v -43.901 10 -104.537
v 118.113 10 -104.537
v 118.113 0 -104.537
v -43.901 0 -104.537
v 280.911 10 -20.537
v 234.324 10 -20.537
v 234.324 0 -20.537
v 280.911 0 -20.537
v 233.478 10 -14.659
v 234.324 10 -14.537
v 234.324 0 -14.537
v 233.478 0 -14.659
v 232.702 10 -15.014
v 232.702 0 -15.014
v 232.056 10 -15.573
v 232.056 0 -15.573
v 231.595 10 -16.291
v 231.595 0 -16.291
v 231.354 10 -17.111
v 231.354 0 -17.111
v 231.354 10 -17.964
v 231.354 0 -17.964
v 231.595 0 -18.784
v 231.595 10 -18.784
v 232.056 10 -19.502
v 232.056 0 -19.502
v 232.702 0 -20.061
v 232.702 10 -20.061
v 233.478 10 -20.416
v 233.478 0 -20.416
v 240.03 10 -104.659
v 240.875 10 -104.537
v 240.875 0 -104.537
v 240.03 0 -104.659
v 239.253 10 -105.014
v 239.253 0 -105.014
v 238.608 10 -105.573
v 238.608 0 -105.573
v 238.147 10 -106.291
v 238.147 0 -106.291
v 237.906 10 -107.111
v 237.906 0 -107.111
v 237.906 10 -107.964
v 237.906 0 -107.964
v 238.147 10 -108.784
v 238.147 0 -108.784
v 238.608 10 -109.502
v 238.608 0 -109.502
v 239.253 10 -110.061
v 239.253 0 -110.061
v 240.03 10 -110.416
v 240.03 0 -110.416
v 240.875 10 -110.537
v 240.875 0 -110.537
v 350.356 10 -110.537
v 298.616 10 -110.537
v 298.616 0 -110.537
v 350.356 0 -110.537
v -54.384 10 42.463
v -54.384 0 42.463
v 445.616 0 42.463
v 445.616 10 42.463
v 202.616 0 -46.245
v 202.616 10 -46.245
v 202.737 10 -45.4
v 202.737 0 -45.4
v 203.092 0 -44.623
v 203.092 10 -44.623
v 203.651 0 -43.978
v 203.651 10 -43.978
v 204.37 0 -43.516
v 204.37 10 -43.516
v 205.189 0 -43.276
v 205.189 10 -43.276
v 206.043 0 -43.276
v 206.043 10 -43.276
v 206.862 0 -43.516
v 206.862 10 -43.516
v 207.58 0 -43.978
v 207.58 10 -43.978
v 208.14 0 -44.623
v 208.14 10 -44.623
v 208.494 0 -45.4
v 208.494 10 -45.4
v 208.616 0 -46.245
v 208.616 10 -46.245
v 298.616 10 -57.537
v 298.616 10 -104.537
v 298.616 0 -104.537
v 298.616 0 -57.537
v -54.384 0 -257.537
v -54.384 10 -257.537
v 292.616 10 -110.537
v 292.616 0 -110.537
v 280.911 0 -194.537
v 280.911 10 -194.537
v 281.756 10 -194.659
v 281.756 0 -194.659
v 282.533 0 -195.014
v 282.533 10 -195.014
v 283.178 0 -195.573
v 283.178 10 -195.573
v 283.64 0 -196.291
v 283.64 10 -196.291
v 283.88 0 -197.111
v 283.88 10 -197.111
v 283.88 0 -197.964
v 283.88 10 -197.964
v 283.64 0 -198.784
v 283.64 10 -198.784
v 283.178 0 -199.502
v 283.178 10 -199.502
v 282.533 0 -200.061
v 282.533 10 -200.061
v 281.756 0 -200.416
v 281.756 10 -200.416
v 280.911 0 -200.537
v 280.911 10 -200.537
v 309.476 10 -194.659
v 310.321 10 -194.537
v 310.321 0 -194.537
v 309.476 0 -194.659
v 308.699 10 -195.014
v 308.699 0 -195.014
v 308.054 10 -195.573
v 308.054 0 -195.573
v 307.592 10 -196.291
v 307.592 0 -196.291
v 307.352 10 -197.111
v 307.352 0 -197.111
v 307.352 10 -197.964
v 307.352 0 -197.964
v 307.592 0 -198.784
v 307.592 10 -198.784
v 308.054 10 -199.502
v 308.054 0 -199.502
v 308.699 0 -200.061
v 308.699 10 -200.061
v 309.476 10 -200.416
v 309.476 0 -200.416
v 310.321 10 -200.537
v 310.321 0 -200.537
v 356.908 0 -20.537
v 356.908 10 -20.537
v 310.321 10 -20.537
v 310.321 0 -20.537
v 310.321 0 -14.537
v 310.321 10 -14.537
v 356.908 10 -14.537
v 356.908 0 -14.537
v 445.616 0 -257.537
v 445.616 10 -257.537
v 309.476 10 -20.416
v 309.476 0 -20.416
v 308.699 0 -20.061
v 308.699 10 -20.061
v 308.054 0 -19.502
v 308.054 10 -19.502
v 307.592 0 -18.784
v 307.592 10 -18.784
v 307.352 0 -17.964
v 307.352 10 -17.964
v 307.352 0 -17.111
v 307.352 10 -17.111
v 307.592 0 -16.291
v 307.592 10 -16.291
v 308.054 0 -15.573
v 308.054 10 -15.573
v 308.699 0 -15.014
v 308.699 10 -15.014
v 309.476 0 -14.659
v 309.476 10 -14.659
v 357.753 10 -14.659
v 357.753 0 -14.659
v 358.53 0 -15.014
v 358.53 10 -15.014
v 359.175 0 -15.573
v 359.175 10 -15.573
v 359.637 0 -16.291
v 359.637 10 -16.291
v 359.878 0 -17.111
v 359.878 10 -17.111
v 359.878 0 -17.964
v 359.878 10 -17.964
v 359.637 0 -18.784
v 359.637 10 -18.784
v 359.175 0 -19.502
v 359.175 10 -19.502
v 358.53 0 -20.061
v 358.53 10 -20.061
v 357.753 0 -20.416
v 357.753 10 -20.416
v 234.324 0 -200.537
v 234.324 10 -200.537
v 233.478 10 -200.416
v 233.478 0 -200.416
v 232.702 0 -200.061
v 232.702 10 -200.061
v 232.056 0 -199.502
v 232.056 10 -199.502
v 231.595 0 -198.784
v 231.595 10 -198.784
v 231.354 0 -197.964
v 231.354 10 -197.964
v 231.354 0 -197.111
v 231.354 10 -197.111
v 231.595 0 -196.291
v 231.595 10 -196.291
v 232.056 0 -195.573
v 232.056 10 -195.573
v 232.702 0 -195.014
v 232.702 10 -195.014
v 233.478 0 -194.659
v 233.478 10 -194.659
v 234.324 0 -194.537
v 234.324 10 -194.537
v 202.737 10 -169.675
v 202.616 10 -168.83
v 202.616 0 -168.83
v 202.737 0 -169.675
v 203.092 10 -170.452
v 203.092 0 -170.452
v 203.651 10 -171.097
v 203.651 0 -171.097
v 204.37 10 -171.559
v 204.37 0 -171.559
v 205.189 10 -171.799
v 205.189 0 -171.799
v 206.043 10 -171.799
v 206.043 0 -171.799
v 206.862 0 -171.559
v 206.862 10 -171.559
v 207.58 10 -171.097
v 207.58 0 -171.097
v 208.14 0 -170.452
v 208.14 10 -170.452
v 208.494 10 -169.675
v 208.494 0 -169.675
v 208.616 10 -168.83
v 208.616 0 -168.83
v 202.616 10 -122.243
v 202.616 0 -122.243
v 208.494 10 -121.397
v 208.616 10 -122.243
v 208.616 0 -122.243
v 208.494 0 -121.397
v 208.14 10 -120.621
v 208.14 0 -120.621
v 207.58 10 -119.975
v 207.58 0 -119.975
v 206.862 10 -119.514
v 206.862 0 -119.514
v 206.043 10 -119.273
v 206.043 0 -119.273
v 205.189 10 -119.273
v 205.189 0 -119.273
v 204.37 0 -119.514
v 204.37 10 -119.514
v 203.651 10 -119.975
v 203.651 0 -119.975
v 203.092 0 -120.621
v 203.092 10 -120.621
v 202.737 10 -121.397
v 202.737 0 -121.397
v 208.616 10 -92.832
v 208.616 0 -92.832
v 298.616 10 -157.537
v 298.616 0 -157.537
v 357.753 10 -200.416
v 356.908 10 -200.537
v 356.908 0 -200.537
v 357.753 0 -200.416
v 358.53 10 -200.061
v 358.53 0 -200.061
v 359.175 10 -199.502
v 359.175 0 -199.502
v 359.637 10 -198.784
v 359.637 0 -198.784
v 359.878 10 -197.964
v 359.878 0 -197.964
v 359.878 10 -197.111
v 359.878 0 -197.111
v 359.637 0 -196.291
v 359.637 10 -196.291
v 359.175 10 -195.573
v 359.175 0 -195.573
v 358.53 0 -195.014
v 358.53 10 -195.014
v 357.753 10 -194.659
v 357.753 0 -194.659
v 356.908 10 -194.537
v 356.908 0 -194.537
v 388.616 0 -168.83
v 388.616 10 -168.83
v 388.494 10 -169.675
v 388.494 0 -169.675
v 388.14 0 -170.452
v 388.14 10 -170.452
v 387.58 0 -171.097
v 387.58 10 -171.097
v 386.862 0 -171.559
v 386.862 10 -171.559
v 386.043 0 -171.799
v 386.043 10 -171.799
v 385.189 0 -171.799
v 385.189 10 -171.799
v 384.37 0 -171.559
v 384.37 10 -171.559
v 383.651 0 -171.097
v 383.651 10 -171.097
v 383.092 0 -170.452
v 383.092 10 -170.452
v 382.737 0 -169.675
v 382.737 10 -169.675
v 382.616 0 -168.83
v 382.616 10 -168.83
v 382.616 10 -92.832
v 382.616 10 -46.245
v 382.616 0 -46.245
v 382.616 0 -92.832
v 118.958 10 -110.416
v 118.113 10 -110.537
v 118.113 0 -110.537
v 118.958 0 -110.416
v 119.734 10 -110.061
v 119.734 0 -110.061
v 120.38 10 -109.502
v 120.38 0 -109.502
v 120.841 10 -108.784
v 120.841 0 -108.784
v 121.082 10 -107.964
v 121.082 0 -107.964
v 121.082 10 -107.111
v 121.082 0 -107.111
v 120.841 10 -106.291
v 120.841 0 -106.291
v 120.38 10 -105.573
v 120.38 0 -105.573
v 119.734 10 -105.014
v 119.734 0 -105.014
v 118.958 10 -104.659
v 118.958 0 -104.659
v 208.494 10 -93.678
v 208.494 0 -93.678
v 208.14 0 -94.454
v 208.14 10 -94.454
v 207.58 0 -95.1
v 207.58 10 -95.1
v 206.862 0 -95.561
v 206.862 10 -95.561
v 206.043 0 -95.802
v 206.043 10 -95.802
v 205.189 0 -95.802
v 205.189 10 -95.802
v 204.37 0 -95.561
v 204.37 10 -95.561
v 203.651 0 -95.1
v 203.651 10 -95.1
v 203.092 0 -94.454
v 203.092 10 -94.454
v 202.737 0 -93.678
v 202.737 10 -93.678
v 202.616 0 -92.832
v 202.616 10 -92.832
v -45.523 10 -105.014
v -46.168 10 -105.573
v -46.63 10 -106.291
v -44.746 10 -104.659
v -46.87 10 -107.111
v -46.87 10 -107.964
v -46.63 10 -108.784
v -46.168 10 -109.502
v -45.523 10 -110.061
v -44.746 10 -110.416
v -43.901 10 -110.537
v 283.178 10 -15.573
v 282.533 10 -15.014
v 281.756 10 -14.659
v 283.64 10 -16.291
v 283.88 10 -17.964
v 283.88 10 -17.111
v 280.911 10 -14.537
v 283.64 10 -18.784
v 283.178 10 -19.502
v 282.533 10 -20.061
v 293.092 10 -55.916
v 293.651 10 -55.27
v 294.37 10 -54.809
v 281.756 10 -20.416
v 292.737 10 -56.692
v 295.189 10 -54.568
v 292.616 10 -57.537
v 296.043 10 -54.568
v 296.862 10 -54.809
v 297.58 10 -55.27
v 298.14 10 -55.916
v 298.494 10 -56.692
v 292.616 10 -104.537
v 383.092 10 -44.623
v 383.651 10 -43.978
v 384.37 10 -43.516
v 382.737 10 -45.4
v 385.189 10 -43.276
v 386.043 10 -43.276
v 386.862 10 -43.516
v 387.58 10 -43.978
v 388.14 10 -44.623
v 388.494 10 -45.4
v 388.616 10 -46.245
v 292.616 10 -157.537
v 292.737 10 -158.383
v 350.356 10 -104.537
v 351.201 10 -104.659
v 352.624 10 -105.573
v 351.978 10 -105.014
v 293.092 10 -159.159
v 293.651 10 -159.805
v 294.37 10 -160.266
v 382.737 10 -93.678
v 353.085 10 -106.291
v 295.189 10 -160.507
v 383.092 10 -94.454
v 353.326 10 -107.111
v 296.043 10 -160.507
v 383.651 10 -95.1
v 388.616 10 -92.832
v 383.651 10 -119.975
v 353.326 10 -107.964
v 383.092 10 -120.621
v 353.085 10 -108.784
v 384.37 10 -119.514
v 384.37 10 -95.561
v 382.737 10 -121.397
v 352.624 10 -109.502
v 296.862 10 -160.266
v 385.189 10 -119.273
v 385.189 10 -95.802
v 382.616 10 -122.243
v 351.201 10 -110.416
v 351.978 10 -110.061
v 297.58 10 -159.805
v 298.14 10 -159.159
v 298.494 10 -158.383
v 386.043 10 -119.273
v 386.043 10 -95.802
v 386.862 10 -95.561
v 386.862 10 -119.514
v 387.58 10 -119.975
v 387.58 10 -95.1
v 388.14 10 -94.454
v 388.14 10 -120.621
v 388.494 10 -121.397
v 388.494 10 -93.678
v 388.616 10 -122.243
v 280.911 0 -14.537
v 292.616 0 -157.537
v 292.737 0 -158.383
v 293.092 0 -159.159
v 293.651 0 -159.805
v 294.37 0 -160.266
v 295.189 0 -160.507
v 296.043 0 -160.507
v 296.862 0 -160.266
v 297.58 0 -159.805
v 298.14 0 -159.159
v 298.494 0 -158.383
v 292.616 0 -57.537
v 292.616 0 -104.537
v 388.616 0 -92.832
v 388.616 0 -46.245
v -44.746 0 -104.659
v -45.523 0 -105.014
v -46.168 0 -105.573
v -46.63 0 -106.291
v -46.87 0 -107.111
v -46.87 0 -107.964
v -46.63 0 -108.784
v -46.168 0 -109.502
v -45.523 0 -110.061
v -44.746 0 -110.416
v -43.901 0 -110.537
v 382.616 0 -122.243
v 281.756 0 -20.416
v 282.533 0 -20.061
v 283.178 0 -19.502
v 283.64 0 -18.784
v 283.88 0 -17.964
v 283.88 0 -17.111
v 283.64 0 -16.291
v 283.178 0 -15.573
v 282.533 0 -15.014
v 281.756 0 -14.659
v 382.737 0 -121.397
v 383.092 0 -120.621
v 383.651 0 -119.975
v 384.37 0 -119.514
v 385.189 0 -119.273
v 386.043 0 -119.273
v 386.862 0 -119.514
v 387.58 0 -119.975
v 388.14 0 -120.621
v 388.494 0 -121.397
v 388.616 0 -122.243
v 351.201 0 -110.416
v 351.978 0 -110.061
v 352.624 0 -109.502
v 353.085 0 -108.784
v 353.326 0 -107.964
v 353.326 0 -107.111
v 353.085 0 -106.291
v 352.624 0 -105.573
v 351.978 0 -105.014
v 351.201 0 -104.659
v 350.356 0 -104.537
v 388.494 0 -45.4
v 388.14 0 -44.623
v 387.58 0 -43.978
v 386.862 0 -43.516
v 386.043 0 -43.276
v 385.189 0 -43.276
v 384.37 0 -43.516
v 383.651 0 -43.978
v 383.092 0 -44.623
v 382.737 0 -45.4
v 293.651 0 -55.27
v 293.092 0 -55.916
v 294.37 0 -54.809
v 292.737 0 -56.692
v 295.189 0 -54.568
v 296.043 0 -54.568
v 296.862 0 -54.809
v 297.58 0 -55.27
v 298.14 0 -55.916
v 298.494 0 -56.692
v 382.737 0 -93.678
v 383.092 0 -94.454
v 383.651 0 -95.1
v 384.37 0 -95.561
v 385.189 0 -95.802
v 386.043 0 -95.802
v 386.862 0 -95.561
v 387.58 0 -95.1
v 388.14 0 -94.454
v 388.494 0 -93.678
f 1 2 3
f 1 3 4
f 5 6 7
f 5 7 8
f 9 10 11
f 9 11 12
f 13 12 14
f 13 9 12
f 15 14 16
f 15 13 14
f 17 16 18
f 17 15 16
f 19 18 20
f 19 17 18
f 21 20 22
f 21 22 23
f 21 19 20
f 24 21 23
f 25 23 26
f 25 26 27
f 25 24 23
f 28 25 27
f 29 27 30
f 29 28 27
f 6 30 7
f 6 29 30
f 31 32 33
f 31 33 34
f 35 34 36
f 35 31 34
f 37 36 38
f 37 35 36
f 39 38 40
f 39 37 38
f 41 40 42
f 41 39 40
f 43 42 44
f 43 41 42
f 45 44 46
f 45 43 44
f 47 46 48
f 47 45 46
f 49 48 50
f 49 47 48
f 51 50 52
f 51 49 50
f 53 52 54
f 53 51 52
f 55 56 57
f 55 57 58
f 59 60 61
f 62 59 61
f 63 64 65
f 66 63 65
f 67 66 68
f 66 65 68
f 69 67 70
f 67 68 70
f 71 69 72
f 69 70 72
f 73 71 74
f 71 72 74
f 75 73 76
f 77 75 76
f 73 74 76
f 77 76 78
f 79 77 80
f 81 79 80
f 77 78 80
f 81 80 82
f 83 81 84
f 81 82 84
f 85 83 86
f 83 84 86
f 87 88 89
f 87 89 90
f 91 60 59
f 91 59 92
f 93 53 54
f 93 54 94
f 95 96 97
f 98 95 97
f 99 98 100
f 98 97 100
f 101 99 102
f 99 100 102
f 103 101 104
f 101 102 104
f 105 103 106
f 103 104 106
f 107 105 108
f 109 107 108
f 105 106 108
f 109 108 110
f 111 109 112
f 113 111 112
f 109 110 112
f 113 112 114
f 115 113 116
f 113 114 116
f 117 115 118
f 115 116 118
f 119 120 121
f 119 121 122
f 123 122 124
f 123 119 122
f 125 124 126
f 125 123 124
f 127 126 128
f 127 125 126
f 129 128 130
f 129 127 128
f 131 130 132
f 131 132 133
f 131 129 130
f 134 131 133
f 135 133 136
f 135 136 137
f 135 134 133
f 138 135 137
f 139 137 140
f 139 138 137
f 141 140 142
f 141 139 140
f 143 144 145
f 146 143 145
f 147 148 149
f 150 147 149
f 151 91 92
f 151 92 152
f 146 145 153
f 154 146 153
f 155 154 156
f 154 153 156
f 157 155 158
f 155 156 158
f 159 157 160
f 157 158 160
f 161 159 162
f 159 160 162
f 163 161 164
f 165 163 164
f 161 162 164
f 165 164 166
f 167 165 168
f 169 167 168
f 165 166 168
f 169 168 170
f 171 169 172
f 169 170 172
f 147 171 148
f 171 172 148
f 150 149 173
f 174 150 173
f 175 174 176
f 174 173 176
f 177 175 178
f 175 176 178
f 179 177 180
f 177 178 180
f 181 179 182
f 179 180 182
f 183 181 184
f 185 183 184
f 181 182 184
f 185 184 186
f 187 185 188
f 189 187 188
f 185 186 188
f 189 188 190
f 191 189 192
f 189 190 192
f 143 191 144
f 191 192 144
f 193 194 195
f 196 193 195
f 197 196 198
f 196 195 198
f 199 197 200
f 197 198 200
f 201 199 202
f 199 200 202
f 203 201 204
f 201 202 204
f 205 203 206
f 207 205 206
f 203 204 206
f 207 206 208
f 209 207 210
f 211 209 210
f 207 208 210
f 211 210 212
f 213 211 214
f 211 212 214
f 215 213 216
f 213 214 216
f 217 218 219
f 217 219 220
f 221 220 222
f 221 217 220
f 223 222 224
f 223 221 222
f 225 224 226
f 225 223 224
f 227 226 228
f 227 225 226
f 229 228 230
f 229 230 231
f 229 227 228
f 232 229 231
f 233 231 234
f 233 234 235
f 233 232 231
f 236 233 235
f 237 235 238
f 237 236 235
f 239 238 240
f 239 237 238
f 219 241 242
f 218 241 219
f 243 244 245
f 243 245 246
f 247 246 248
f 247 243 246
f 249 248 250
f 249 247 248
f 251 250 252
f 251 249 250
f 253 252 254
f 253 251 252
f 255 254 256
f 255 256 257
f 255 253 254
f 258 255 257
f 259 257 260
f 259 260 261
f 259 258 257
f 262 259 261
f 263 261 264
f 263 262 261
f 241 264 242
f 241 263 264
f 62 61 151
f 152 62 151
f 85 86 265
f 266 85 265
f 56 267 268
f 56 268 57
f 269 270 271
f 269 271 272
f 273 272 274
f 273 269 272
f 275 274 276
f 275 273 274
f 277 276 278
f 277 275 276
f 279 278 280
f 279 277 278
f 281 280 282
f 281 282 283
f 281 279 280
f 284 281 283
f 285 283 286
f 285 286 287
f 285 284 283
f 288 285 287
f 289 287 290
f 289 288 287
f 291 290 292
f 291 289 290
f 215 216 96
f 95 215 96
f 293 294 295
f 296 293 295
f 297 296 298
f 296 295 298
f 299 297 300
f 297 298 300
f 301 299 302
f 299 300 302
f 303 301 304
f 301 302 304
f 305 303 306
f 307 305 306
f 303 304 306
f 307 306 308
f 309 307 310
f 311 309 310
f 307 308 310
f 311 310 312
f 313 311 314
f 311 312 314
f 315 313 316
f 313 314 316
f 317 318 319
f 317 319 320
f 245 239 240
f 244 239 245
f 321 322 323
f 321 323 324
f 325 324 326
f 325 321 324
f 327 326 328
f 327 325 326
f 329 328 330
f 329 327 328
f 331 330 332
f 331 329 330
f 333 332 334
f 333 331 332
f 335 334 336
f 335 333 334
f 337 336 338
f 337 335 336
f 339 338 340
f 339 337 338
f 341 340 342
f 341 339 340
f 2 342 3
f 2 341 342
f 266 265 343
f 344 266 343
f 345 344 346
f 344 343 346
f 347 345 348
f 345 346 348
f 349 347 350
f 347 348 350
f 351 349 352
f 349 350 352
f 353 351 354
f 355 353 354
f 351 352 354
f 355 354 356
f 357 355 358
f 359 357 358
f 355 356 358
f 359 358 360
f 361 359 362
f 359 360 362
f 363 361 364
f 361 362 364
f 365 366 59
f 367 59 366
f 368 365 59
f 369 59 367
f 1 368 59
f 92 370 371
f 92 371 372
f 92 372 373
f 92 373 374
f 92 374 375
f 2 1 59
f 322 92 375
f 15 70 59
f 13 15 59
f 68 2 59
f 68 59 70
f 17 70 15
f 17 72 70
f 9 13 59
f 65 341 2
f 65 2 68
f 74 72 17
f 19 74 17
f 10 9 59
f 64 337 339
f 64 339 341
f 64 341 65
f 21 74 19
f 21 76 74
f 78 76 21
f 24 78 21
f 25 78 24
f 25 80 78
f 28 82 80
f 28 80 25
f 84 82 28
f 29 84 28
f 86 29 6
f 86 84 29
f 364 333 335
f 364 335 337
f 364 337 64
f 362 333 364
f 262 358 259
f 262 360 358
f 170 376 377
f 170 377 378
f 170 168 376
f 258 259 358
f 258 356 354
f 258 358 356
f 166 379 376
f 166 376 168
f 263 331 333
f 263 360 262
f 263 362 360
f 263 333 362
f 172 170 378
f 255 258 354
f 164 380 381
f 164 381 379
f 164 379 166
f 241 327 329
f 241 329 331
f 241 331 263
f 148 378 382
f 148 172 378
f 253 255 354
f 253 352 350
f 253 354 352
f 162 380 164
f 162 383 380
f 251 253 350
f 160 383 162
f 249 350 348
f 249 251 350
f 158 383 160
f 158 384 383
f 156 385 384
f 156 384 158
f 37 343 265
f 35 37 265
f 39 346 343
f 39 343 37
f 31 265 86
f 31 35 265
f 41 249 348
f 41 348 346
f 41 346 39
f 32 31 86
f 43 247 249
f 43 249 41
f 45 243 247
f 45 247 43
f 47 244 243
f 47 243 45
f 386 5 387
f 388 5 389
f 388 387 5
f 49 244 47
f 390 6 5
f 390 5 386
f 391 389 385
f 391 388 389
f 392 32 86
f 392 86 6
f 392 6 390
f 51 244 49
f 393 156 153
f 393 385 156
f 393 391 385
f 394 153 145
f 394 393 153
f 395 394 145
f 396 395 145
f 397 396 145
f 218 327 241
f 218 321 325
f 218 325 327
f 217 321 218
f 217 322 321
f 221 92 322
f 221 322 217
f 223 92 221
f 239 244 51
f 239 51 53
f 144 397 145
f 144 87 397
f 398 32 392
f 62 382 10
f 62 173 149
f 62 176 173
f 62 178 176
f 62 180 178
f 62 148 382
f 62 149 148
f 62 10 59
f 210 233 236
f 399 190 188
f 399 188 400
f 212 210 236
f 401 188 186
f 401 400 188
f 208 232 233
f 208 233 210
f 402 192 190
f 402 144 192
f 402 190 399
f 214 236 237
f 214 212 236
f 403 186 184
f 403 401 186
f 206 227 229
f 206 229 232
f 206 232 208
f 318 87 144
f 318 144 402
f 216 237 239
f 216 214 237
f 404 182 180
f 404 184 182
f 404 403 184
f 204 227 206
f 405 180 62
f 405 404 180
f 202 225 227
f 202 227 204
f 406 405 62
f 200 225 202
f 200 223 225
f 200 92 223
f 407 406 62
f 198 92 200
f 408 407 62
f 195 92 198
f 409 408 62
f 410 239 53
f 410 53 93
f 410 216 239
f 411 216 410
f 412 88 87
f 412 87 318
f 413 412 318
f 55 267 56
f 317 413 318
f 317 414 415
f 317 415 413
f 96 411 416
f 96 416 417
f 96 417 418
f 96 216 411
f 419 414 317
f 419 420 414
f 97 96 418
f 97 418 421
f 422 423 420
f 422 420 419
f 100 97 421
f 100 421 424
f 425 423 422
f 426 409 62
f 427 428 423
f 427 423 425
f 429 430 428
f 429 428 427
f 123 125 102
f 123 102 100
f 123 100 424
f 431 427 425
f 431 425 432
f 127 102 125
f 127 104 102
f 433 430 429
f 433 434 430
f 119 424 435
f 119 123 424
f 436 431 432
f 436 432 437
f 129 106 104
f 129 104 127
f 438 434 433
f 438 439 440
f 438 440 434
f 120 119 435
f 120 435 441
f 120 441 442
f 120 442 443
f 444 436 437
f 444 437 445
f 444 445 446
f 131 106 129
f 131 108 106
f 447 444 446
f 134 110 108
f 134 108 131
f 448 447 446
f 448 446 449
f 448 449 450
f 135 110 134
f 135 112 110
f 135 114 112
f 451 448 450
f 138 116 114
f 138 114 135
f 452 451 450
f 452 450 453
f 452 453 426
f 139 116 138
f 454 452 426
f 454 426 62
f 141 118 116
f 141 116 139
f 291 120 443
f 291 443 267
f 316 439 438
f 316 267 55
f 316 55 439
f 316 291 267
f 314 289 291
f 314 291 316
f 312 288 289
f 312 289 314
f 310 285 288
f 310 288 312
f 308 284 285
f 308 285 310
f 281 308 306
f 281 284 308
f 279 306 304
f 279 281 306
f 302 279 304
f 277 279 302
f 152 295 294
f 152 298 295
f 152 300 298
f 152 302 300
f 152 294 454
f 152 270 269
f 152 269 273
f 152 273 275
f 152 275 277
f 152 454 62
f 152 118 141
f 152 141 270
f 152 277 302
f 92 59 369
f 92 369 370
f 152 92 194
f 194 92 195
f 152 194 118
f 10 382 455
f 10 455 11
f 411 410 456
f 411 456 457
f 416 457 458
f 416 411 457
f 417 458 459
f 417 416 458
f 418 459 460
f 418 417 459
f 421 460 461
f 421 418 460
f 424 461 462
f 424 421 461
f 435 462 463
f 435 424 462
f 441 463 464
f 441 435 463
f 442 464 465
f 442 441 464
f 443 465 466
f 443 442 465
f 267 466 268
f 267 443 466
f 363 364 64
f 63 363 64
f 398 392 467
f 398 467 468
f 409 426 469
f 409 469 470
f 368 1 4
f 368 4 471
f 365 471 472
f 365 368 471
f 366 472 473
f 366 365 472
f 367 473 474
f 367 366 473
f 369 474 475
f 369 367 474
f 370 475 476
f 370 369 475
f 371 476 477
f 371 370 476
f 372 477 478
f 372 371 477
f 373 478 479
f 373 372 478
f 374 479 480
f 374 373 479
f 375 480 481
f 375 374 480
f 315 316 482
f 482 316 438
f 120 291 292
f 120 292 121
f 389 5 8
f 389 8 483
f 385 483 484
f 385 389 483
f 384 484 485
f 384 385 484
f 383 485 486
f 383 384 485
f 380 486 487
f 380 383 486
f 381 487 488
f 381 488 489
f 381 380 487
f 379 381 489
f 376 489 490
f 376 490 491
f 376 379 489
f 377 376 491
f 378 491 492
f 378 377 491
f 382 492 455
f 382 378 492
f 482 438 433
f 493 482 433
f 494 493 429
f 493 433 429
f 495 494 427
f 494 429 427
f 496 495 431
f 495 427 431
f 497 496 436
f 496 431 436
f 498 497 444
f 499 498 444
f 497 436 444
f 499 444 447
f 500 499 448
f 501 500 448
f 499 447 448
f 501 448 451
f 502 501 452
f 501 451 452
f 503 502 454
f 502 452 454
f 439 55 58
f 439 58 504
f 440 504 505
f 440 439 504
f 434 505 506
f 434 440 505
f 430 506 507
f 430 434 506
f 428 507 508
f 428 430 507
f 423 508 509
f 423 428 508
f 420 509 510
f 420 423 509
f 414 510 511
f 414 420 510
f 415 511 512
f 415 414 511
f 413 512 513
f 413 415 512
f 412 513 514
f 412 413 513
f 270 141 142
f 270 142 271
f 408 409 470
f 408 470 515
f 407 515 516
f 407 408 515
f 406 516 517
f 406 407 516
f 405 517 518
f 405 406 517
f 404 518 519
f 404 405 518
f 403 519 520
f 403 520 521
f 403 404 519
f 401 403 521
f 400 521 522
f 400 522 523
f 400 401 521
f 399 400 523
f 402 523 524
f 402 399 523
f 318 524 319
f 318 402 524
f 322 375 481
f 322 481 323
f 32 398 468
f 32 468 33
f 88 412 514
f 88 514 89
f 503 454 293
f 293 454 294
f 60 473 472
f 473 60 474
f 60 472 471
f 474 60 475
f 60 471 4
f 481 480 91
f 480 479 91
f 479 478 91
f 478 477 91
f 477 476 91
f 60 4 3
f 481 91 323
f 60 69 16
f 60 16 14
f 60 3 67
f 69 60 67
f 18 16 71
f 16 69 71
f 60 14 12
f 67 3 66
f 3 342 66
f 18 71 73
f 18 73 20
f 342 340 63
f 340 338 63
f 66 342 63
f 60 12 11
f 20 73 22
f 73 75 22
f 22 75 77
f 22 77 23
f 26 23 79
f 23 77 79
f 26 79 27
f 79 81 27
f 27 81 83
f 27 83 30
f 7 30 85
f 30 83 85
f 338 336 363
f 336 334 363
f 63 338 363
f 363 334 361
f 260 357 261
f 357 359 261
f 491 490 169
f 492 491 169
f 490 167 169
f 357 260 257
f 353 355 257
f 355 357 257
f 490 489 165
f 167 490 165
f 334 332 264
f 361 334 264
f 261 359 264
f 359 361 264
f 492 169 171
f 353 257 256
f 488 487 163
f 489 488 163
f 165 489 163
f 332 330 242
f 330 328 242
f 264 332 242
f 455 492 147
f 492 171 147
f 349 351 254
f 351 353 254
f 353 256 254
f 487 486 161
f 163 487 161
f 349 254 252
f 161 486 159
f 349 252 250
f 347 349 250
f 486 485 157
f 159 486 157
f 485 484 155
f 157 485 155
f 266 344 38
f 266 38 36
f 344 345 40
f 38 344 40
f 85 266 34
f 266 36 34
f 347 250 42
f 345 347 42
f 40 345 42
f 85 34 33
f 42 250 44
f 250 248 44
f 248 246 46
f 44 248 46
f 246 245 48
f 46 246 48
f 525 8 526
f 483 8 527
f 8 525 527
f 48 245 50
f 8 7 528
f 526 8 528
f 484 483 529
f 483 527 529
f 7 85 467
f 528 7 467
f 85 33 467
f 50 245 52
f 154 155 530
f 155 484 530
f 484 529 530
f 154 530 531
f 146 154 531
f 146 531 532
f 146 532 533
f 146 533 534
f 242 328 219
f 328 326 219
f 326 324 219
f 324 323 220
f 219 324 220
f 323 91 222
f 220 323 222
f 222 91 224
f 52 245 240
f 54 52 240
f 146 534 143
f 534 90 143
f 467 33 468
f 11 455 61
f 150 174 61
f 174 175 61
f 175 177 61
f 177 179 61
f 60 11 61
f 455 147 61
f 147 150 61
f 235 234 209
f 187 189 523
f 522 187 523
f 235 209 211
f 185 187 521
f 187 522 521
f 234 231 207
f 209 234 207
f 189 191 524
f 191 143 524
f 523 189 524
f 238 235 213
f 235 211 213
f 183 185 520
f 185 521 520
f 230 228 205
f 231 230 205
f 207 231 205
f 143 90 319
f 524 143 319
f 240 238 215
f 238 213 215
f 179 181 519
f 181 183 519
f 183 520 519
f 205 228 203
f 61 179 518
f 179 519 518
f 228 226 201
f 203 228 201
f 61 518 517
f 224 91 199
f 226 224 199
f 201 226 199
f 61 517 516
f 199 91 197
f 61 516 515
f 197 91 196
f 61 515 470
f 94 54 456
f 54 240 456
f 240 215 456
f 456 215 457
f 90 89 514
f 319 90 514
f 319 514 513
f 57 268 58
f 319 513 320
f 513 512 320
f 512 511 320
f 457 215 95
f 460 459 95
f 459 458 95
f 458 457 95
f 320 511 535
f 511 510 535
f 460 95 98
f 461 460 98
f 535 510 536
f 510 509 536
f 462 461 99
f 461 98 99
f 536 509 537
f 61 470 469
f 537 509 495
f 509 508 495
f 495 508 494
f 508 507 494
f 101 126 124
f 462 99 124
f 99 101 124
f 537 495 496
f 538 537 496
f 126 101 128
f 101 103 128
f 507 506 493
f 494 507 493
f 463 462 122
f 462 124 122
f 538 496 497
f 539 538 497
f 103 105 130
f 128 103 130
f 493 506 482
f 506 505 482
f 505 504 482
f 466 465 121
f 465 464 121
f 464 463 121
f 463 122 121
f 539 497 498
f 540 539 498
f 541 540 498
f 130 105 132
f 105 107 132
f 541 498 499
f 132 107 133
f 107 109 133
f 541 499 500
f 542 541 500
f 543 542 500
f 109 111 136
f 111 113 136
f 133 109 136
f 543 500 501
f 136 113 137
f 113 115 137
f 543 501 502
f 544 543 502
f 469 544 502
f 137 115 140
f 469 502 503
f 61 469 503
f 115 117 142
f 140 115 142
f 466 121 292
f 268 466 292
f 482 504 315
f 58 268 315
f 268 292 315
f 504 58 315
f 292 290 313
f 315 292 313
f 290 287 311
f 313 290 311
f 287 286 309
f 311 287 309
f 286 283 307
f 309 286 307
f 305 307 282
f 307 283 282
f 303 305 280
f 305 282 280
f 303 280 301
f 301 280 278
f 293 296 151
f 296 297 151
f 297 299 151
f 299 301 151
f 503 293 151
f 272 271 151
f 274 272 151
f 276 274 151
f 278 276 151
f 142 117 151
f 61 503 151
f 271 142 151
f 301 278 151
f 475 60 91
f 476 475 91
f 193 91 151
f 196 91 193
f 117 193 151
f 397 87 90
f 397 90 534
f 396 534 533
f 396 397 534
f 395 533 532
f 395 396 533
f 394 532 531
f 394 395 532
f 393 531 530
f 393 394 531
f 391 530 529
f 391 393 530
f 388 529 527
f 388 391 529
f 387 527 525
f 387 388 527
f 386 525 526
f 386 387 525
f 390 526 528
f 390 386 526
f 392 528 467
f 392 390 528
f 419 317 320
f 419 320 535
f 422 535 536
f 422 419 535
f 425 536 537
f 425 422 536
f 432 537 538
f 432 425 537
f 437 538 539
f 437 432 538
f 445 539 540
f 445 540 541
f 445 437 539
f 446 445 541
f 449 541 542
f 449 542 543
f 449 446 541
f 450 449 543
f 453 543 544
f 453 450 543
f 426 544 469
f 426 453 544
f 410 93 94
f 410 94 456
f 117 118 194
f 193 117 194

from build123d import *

# Parameters (mm, degrees)
SKETCH1_W           = 500
SKETCH1_H           = 300
BOSS_EXTRUDE1_DEPTH = 10
CUT_EXTRUDE1_DEPTH  = 10
CUT_EXTRUDE2_DEPTH  = 515.780562137
CUT_EXTRUDE3_DEPTH  = 515.780562137


with BuildPart() as part:
    # Sketch1 → Boss-Extrude1 (new body)
    with BuildSketch(Plane(origin=(0, 0, 0), x_dir=(1, 0, 0), z_dir=(0, 1, 0))):
        with Locations((195.615833125, 107.53748547)):
            Rectangle(SKETCH1_W, SKETCH1_H)
    extrude(amount=BOSS_EXTRUDE1_DEPTH)

    # Sketch2 → Cut-Extrude1 (cut)
    with BuildSketch(Plane(origin=(0, 10, 0), x_dir=(1, 0, 0), z_dir=(0, 1, 0))):
        with BuildLine():
            Line((208.615833125, 168.829709188), (208.615833125, 122.242622587))
            ThreePointArc((208.615833125, 122.242622587), (205.615833125, 119.242622587), (202.615833125, 122.242622587))
            Line((202.615833125, 122.242622587), (202.615833125, 168.829709188))
            ThreePointArc((202.615833125, 168.829709188), (205.615833125, 171.829709188), (208.615833125, 168.829709188))
        make_face()
        with BuildLine():
            Line((208.615833125, 46.245261752), (208.615833125, 92.832348352))
            ThreePointArc((208.615833125, 92.832348352), (205.615833125, 95.832348352), (202.615833125, 92.832348352))
            Line((202.615833125, 92.832348352), (202.615833125, 46.245261752))
            ThreePointArc((202.615833125, 46.245261752), (205.615833125, 43.245261752), (208.615833125, 46.245261752))
        make_face()
        with BuildLine():
            Line((356.908056843, 194.53748547), (310.320970243, 194.53748547))
            ThreePointArc((310.320970243, 194.53748547), (307.320970243, 197.53748547), (310.320970243, 200.53748547))
            Line((310.320970243, 200.53748547), (356.908056843, 200.53748547))
            ThreePointArc((356.908056843, 200.53748547), (359.908056843, 197.53748547), (356.908056843, 194.53748547))
        make_face()
        with BuildLine():
            Line((234.323609407, 194.53748547), (280.910696008, 194.53748547))
            ThreePointArc((280.910696008, 194.53748547), (283.910696008, 197.53748547), (280.910696008, 200.53748547))
            Line((280.910696008, 200.53748547), (234.323609407, 200.53748547))
            ThreePointArc((234.323609407, 200.53748547), (231.323609407, 197.53748547), (234.323609407, 194.53748547))
        make_face()
        with BuildLine():
            Line((382.615833125, 46.245261752), (382.615833125, 92.832348352))
            ThreePointArc((382.615833125, 92.832348352), (385.615833125, 95.832348352), (388.615833125, 92.832348352))
            Line((388.615833125, 92.832348352), (388.615833125, 46.245261752))
            ThreePointArc((388.615833125, 46.245261752), (385.615833125, 43.245261752), (382.615833125, 46.245261752))
        make_face()
        with BuildLine():
            Line((382.615833125, 168.829709188), (382.615833125, 122.242622587))
            ThreePointArc((382.615833125, 122.242622587), (385.615833125, 119.242622587), (388.615833125, 122.242622587))
            Line((388.615833125, 122.242622587), (388.615833125, 168.829709188))
            ThreePointArc((388.615833125, 168.829709188), (385.615833125, 171.829709188), (382.615833125, 168.829709188))
        make_face()
        with BuildLine():
            Line((234.323609407, 20.53748547), (280.910696008, 20.53748547))
            ThreePointArc((280.910696008, 20.53748547), (283.910696008, 17.53748547), (280.910696008, 14.53748547))
            Line((280.910696008, 14.53748547), (234.323609407, 14.53748547))
            ThreePointArc((234.323609407, 14.53748547), (231.323609407, 17.53748547), (234.323609407, 20.53748547))
        make_face()
        with BuildLine():
            Line((356.908056843, 20.53748547), (310.320970243, 20.53748547))
            ThreePointArc((310.320970243, 20.53748547), (307.320970243, 17.53748547), (310.320970243, 14.53748547))
            Line((310.320970243, 14.53748547), (356.908056843, 14.53748547))
            ThreePointArc((356.908056843, 14.53748547), (359.908056843, 17.53748547), (356.908056843, 20.53748547))
        make_face()
    extrude(amount=-CUT_EXTRUDE1_DEPTH, mode=Mode.SUBTRACT)

    # Sketch6 → Cut-Extrude2 (cut, through all)
    with BuildSketch(Plane(origin=(0, 10, 0), x_dir=(1, 0, 0), z_dir=(0, 1, 0))):
        with BuildLine():
            Line((-43.900749025, 110.53748547), (118.112557876, 110.53748547))
            ThreePointArc((118.112557876, 110.53748547), (121.112557876, 107.53748547), (118.112557876, 104.53748547))
            Line((118.112557876, 104.53748547), (-43.900749025, 104.53748547))
            ThreePointArc((-43.900749025, 104.53748547), (-46.900749025, 107.53748547), (-43.900749025, 110.53748547))
        make_face()
    extrude(amount=-CUT_EXTRUDE2_DEPTH, mode=Mode.SUBTRACT)

    # Sketch7 → Cut-Extrude3 (cut, through all)
    with BuildSketch(Plane(origin=(0, 10, 0), x_dir=(1, 0, 0), z_dir=(0, 1, 0))):
        with BuildLine():
            Line((292.615833125, 110.53748547), (292.615833125, 157.53748547))
            ThreePointArc((292.615833125, 157.53748547), (295.615833125, 160.53748547), (298.615833125, 157.53748547))
            Line((298.615833125, 157.53748547), (298.615833125, 110.53748547))
            Line((298.615833125, 110.53748547), (350.356251663, 110.53748547))
            ThreePointArc((350.356251663, 110.53748547), (353.356251663, 107.53748547), (350.356251663, 104.53748547))
            Line((350.356251663, 104.53748547), (298.615833125, 104.53748547))
            Line((298.615833125, 104.53748547), (298.615833125, 57.53748547))
            ThreePointArc((298.615833125, 57.53748547), (295.615833125, 54.53748547), (292.615833125, 57.53748547))
            Line((292.615833125, 57.53748547), (292.615833125, 104.53748547))
            Line((292.615833125, 104.53748547), (240.875414588, 104.53748547))
            ThreePointArc((240.875414588, 104.53748547), (237.875414588, 107.53748547), (240.875414588, 110.53748547))
            Line((240.875414588, 110.53748547), (292.615833125, 110.53748547))
        make_face()
    extrude(amount=-CUT_EXTRUDE3_DEPTH, mode=Mode.SUBTRACT)


solid = part.part
